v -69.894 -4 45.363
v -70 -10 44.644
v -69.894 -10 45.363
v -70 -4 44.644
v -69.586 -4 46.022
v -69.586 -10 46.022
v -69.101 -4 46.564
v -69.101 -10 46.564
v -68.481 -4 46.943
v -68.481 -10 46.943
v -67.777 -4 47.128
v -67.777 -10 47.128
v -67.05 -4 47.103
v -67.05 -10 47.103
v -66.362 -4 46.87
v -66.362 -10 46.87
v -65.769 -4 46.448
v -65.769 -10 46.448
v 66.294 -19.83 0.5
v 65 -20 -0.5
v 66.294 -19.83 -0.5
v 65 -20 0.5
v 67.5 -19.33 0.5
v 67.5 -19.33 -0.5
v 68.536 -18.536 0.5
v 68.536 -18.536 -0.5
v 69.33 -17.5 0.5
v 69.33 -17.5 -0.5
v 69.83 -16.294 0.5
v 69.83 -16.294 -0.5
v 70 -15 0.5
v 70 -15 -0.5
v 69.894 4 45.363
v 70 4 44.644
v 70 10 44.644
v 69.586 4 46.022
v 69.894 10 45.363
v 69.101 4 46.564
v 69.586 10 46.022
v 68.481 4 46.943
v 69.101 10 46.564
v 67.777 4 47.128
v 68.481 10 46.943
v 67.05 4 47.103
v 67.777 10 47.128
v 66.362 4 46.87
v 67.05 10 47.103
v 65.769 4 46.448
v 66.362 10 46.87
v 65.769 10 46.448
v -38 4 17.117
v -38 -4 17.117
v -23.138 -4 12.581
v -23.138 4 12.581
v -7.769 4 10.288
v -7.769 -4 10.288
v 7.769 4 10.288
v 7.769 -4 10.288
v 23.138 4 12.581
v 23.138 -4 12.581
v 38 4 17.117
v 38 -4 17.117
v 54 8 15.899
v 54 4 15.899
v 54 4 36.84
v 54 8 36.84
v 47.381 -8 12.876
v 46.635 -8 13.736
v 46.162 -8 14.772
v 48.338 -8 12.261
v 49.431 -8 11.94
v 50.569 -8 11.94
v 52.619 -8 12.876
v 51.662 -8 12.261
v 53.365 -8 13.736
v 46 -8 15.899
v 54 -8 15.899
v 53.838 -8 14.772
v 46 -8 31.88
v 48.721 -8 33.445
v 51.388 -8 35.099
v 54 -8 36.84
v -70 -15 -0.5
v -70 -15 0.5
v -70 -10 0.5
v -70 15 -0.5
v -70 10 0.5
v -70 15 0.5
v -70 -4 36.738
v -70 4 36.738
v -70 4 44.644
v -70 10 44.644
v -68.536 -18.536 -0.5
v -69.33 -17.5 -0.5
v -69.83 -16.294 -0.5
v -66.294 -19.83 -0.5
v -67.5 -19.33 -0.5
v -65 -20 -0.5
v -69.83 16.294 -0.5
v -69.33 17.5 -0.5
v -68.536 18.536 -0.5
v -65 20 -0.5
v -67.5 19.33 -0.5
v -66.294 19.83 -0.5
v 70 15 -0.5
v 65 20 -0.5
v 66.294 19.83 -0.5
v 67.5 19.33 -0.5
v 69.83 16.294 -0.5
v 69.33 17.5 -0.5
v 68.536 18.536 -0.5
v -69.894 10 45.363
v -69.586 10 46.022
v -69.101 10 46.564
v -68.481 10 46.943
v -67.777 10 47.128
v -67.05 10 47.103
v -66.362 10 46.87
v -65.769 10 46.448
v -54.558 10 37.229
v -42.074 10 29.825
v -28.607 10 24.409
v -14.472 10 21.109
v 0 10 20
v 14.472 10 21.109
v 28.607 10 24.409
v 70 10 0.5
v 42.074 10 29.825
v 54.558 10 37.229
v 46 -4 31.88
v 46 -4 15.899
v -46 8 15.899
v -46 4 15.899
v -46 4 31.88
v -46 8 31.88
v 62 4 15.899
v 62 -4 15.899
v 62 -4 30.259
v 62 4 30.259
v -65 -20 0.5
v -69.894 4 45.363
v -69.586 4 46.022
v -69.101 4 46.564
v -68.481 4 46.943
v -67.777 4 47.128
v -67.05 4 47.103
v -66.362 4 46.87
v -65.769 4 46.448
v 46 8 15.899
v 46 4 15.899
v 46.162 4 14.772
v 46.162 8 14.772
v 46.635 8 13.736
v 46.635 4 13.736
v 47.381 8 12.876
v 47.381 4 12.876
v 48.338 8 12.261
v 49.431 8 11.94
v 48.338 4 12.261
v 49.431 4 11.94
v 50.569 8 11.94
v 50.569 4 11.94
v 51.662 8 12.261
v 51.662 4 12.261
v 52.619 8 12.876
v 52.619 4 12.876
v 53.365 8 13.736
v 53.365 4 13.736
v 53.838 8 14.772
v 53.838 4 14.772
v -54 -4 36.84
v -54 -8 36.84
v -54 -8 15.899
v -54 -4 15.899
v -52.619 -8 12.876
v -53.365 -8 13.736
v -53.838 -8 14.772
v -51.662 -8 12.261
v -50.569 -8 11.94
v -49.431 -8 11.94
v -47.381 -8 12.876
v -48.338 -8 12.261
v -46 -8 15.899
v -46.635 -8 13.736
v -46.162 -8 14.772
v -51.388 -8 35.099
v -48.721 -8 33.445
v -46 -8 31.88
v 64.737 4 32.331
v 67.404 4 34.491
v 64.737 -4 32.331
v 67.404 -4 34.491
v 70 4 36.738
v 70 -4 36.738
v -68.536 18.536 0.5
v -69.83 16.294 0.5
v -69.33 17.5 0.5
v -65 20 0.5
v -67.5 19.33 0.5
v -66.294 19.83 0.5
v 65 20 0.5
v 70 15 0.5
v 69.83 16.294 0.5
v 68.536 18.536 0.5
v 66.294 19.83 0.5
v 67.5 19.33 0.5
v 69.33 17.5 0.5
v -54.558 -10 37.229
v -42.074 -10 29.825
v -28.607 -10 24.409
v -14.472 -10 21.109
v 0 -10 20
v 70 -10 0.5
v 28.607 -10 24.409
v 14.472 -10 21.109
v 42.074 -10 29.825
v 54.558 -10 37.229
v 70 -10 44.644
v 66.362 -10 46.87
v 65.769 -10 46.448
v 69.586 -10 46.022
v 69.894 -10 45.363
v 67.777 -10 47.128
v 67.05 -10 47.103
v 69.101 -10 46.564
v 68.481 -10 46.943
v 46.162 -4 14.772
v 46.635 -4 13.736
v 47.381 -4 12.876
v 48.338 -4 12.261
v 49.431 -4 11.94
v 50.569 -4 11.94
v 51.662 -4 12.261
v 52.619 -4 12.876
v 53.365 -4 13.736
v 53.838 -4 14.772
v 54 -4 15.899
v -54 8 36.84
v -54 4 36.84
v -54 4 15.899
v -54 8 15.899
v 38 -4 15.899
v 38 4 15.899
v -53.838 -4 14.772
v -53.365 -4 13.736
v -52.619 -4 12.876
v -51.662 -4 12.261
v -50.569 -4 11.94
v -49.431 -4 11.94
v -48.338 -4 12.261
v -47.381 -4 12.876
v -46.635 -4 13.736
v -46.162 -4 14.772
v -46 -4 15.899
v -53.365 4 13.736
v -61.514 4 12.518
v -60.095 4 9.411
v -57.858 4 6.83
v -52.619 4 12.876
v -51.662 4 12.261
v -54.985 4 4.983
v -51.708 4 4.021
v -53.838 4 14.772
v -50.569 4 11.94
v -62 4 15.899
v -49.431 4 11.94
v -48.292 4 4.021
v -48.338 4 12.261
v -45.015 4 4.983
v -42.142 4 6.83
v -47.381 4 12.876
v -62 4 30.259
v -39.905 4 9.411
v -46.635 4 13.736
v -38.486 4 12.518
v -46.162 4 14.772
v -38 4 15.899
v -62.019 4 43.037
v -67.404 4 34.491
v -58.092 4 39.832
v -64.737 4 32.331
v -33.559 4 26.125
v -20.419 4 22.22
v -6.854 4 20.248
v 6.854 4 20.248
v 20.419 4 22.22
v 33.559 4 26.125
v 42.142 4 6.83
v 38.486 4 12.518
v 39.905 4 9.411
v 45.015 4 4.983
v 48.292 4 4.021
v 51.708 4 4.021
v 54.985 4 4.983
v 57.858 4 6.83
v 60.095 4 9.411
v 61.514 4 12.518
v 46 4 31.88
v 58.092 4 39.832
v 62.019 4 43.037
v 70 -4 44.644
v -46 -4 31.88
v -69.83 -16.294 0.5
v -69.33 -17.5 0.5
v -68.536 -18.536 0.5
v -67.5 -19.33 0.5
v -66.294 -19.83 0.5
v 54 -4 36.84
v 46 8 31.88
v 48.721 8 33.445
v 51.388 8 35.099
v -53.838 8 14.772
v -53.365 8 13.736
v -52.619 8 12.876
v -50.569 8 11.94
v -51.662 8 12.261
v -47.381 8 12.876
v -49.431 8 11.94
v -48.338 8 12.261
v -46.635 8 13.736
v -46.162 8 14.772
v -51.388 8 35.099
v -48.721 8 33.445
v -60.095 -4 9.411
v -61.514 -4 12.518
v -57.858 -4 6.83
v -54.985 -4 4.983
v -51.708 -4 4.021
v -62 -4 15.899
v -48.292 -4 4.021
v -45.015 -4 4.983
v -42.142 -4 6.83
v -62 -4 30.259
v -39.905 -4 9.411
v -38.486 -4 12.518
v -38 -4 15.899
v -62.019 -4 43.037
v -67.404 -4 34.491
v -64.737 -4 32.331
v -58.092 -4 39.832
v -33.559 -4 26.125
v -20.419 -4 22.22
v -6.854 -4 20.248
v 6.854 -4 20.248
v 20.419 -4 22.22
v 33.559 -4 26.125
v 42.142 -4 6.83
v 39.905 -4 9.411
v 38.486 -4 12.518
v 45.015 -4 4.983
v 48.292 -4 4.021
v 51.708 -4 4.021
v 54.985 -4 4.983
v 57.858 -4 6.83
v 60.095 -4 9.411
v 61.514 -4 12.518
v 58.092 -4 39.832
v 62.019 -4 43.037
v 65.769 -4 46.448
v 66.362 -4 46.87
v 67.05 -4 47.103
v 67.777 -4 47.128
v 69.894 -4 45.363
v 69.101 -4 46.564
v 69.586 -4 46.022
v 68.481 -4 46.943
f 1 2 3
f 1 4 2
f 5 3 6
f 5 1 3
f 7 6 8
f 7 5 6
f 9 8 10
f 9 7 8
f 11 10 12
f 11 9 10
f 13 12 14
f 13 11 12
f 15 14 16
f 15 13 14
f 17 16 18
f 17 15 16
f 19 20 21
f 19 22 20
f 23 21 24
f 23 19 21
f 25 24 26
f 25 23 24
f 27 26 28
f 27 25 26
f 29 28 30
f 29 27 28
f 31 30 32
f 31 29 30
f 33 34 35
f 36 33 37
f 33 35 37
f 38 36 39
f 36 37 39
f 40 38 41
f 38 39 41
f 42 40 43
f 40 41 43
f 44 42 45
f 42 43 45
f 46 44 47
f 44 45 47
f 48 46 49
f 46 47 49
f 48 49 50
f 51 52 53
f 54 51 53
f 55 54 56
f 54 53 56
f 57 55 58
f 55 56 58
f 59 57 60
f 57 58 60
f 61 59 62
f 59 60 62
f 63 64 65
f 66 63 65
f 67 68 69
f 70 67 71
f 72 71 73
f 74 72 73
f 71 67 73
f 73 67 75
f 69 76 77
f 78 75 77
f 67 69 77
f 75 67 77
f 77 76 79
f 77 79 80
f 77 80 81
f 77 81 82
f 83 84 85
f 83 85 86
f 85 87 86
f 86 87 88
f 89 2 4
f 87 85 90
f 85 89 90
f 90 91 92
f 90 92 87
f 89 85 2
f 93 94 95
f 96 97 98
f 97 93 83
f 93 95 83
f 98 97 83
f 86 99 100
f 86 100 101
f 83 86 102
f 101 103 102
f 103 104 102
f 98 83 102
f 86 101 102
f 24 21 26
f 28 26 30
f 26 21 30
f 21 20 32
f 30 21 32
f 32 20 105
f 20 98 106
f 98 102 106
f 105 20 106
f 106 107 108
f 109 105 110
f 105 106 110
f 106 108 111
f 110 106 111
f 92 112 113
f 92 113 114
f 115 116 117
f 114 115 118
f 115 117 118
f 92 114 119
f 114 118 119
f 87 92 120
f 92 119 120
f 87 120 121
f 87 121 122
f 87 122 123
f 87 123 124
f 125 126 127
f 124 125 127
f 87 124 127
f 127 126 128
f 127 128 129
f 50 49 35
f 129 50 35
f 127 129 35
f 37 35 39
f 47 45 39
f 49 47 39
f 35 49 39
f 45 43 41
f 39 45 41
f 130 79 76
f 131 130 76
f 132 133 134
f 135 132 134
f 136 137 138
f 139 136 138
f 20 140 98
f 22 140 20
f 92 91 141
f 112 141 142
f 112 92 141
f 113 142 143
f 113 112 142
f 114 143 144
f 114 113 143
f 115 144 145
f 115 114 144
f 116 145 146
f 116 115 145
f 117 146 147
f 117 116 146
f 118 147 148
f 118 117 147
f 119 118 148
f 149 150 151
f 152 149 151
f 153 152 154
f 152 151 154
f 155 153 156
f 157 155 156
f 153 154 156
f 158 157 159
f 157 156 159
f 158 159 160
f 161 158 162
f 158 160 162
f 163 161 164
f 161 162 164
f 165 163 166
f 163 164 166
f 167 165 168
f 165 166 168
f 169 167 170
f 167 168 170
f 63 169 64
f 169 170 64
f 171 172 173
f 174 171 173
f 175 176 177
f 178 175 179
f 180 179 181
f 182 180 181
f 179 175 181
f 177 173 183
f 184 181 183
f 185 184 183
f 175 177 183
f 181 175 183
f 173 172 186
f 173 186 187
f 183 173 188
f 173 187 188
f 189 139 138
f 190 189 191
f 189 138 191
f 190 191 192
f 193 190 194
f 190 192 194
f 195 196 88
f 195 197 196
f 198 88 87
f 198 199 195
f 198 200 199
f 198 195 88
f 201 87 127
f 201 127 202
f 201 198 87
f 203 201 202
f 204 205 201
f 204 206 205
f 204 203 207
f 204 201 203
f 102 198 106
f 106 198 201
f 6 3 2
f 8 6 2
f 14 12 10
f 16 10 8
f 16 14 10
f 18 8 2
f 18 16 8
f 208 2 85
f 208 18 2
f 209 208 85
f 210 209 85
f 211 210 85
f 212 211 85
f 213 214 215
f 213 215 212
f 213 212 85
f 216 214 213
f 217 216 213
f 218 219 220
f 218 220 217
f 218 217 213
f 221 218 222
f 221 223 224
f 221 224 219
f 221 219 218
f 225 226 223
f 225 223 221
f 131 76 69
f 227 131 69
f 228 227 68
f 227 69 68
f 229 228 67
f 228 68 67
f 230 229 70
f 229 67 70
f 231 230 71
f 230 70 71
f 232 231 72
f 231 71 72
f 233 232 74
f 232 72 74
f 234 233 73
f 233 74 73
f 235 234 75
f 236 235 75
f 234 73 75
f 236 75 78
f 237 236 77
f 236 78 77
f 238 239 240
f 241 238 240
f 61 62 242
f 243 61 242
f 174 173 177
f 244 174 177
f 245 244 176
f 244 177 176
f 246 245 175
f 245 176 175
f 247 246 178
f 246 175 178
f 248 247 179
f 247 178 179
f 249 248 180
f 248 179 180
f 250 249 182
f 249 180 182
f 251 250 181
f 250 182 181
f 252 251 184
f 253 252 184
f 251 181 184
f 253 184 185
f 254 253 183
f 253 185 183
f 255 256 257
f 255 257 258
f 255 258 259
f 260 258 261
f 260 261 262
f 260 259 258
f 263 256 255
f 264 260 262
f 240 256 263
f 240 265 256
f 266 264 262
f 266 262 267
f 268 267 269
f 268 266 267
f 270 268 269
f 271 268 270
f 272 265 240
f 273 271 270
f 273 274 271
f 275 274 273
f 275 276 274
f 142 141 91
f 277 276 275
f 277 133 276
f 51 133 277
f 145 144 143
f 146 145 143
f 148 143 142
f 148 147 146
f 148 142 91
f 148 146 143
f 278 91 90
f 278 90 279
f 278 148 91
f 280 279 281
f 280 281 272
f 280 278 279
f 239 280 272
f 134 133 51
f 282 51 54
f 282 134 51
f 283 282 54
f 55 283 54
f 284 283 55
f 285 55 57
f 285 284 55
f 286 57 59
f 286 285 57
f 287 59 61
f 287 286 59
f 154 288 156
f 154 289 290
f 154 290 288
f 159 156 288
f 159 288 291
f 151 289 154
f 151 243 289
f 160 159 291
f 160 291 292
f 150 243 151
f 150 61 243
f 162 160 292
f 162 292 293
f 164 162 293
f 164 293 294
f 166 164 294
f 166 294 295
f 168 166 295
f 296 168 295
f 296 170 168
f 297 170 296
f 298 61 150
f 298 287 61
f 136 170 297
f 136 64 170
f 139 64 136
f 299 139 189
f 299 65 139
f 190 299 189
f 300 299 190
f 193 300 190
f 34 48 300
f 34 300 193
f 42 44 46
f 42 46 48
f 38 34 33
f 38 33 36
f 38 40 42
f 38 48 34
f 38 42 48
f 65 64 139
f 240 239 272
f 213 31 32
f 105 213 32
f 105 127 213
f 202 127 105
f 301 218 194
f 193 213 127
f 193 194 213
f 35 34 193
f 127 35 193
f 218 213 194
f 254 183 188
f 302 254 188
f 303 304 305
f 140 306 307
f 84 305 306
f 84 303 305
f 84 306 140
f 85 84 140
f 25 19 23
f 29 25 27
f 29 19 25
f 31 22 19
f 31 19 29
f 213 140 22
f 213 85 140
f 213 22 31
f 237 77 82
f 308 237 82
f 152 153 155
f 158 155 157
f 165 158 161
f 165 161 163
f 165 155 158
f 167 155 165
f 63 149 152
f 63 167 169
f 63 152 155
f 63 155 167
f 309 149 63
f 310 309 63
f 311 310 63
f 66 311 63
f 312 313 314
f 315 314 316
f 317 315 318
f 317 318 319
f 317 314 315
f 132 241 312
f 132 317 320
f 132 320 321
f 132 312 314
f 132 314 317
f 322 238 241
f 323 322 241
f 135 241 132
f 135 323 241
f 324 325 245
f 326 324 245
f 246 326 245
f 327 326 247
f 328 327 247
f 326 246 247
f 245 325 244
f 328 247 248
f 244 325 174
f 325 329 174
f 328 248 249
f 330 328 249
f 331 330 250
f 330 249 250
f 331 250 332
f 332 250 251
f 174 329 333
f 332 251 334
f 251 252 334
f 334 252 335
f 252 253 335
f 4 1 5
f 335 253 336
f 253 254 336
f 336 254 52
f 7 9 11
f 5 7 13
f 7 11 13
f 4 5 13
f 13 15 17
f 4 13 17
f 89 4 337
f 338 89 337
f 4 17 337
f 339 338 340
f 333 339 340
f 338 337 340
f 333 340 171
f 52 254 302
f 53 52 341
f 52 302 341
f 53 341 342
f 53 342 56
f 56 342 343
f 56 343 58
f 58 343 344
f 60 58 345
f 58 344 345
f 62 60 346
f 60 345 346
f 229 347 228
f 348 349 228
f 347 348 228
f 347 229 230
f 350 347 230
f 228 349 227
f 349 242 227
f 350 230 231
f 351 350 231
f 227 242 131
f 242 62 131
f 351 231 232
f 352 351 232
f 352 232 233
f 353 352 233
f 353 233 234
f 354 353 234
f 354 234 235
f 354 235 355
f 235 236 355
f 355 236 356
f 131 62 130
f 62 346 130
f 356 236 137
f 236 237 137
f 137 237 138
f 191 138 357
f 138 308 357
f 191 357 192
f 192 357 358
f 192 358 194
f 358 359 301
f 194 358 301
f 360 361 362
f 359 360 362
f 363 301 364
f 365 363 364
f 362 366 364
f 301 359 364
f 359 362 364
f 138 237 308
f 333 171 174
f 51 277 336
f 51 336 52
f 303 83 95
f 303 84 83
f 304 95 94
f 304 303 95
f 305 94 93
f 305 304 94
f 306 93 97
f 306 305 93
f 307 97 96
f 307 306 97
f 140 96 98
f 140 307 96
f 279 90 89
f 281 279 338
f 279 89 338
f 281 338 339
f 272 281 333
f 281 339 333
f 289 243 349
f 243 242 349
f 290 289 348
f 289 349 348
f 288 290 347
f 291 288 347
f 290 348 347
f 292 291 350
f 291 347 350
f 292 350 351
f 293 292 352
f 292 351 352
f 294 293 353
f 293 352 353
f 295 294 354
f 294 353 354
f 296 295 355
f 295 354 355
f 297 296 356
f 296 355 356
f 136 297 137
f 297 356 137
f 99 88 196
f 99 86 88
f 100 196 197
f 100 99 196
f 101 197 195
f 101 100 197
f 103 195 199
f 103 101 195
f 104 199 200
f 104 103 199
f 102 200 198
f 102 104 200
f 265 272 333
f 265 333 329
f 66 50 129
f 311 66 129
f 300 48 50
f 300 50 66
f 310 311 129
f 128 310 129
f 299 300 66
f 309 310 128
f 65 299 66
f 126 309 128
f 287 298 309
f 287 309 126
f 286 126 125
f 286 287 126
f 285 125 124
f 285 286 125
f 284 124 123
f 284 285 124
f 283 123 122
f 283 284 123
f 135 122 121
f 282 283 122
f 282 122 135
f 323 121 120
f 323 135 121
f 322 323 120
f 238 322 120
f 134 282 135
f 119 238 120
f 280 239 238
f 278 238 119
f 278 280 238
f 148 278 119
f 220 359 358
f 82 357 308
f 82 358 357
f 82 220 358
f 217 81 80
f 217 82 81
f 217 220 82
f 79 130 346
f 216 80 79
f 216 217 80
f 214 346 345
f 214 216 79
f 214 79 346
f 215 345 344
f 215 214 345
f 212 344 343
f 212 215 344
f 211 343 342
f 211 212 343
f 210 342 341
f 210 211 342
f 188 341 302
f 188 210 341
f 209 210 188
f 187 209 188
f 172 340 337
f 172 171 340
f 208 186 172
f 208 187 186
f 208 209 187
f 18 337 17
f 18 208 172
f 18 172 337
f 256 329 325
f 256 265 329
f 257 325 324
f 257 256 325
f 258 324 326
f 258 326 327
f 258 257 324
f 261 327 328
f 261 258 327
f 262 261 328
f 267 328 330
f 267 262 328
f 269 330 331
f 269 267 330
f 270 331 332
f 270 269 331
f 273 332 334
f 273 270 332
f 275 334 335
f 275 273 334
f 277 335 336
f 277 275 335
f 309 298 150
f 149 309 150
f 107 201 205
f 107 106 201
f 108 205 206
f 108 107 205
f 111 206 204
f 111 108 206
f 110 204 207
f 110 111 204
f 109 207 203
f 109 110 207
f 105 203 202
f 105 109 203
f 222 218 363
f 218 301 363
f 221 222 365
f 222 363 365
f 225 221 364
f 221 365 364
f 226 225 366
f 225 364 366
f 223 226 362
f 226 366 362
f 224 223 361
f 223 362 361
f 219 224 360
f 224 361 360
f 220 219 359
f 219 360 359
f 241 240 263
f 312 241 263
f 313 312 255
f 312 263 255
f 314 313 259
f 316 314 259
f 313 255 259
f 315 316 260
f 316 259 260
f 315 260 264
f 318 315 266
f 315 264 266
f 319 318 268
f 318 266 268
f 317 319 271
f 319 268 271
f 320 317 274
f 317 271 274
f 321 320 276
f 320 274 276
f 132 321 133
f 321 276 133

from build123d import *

# Parameters (mm, degrees)
F1_DEPTH      = 10
F2_R          = 105
F3_DEPTH      = 4
F3_DEPTH_BACK = 4
F4_R          = 2.5
F6_DEPTH      = 4
F8_START      = -2
F8_DEPTH      = 16
F9_W          = 140
F9_H          = 40
F10_DEPTH     = 0.5
F11_R         = 5


with BuildPart() as f1:
    # F0 (on Front) → F1 (new body, symmetric)
    with BuildSketch(Plane.XZ):
        with BuildLine():
            Line((-70, 50.7738371067), (-70, 0))
            Line((-70, 0), (70, 0))
            Line((70, 0), (70, 50.7738371067))
            ThreePointArc((70, 50.7738371067), (0, 20), (-70, 50.7738371067))
        make_face()
    extrude(amount=F1_DEPTH, both=True)

    # F2 (on Front) → F3 (cut, two sides)
    with BuildSketch(Plane.XZ) as f3_sk:
        with Locations((0, 115)):
            Circle(F2_R)
    extrude(amount=-F3_DEPTH, mode=Mode.SUBTRACT)
    extrude(f3_sk.sketch, amount=F3_DEPTH_BACK, mode=Mode.SUBTRACT)

    # F4
    f4_edges = [f1.edges().sort_by_distance(p)[0] for p in [
        (-70, 7, 50.773837),
        (-70, -7, 50.773837),
        (70, 7, 50.773837),
        (70, -7, 50.773837),
    ]]
    fillet(f4_edges, radius=F4_R)

    # F5 (on Front) → F6 (cut, symmetric)
    with BuildSketch(Plane.XZ):
        with BuildLine():
            Line((-62, 43.0208363483), (-62, 15.899041377))
            ThreePointArc((-62, 15.899041377), (-50, 3.899041377), (-38, 15.899041377))
            Line((-38, 15.899041377), (-38, 43.0208363483))
            Line((-38, 43.0208363483), (-62, 43.0208363483))
        make_face()
        with BuildLine():
            ThreePointArc((38, 15.899041377), (50, 3.899041377), (62, 15.899041377))
            Line((62, 15.899041377), (62, 43.0208363483))
            Line((62, 43.0208363483), (38, 43.0208363483))
            Line((38, 43.0208363483), (38, 15.899041377))
        make_face()
    extrude(amount=F6_DEPTH, both=True, mode=Mode.SUBTRACT)

    # F7 (on face) → F8 (cut)
    with BuildSketch(Plane.XZ.offset(10).offset(F8_START)):
        with BuildLine():
            Line((-54, 36.8399078813), (-54, 15.899041377))
            ThreePointArc((-54, 15.899041377), (-50, 11.899041377), (-46, 15.899041377))
            Line((-46, 15.899041377), (-46, 36.8399078813))
            Line((-46, 36.8399078813), (-54, 36.8399078813))
        make_face()
        with BuildLine():
            ThreePointArc((46, 15.899041377), (50, 11.899041377), (54, 15.899041377))
            Line((54, 15.899041377), (54, 36.8399078813))
            Line((54, 36.8399078813), (46, 36.8399078813))
            Line((46, 36.8399078813), (46, 15.899041377))
        make_face()
    extrude(amount=-F8_DEPTH, mode=Mode.SUBTRACT)

    # F9 (on Top) → F10 (join, symmetric)
    with BuildSketch(Plane.XY):
        Rectangle(F9_W, F9_H)
    extrude(amount=F10_DEPTH, both=True)

    # F11
    f11_edges = [f1.edges().sort_by_distance(p)[0] for p in [
        (-70, -20, 0),
        (70, -20, 0),
        (70, 20, 0),
        (-70, 20, 0),
    ]]
    fillet(f11_edges, radius=F11_R)


solid = f1.part
